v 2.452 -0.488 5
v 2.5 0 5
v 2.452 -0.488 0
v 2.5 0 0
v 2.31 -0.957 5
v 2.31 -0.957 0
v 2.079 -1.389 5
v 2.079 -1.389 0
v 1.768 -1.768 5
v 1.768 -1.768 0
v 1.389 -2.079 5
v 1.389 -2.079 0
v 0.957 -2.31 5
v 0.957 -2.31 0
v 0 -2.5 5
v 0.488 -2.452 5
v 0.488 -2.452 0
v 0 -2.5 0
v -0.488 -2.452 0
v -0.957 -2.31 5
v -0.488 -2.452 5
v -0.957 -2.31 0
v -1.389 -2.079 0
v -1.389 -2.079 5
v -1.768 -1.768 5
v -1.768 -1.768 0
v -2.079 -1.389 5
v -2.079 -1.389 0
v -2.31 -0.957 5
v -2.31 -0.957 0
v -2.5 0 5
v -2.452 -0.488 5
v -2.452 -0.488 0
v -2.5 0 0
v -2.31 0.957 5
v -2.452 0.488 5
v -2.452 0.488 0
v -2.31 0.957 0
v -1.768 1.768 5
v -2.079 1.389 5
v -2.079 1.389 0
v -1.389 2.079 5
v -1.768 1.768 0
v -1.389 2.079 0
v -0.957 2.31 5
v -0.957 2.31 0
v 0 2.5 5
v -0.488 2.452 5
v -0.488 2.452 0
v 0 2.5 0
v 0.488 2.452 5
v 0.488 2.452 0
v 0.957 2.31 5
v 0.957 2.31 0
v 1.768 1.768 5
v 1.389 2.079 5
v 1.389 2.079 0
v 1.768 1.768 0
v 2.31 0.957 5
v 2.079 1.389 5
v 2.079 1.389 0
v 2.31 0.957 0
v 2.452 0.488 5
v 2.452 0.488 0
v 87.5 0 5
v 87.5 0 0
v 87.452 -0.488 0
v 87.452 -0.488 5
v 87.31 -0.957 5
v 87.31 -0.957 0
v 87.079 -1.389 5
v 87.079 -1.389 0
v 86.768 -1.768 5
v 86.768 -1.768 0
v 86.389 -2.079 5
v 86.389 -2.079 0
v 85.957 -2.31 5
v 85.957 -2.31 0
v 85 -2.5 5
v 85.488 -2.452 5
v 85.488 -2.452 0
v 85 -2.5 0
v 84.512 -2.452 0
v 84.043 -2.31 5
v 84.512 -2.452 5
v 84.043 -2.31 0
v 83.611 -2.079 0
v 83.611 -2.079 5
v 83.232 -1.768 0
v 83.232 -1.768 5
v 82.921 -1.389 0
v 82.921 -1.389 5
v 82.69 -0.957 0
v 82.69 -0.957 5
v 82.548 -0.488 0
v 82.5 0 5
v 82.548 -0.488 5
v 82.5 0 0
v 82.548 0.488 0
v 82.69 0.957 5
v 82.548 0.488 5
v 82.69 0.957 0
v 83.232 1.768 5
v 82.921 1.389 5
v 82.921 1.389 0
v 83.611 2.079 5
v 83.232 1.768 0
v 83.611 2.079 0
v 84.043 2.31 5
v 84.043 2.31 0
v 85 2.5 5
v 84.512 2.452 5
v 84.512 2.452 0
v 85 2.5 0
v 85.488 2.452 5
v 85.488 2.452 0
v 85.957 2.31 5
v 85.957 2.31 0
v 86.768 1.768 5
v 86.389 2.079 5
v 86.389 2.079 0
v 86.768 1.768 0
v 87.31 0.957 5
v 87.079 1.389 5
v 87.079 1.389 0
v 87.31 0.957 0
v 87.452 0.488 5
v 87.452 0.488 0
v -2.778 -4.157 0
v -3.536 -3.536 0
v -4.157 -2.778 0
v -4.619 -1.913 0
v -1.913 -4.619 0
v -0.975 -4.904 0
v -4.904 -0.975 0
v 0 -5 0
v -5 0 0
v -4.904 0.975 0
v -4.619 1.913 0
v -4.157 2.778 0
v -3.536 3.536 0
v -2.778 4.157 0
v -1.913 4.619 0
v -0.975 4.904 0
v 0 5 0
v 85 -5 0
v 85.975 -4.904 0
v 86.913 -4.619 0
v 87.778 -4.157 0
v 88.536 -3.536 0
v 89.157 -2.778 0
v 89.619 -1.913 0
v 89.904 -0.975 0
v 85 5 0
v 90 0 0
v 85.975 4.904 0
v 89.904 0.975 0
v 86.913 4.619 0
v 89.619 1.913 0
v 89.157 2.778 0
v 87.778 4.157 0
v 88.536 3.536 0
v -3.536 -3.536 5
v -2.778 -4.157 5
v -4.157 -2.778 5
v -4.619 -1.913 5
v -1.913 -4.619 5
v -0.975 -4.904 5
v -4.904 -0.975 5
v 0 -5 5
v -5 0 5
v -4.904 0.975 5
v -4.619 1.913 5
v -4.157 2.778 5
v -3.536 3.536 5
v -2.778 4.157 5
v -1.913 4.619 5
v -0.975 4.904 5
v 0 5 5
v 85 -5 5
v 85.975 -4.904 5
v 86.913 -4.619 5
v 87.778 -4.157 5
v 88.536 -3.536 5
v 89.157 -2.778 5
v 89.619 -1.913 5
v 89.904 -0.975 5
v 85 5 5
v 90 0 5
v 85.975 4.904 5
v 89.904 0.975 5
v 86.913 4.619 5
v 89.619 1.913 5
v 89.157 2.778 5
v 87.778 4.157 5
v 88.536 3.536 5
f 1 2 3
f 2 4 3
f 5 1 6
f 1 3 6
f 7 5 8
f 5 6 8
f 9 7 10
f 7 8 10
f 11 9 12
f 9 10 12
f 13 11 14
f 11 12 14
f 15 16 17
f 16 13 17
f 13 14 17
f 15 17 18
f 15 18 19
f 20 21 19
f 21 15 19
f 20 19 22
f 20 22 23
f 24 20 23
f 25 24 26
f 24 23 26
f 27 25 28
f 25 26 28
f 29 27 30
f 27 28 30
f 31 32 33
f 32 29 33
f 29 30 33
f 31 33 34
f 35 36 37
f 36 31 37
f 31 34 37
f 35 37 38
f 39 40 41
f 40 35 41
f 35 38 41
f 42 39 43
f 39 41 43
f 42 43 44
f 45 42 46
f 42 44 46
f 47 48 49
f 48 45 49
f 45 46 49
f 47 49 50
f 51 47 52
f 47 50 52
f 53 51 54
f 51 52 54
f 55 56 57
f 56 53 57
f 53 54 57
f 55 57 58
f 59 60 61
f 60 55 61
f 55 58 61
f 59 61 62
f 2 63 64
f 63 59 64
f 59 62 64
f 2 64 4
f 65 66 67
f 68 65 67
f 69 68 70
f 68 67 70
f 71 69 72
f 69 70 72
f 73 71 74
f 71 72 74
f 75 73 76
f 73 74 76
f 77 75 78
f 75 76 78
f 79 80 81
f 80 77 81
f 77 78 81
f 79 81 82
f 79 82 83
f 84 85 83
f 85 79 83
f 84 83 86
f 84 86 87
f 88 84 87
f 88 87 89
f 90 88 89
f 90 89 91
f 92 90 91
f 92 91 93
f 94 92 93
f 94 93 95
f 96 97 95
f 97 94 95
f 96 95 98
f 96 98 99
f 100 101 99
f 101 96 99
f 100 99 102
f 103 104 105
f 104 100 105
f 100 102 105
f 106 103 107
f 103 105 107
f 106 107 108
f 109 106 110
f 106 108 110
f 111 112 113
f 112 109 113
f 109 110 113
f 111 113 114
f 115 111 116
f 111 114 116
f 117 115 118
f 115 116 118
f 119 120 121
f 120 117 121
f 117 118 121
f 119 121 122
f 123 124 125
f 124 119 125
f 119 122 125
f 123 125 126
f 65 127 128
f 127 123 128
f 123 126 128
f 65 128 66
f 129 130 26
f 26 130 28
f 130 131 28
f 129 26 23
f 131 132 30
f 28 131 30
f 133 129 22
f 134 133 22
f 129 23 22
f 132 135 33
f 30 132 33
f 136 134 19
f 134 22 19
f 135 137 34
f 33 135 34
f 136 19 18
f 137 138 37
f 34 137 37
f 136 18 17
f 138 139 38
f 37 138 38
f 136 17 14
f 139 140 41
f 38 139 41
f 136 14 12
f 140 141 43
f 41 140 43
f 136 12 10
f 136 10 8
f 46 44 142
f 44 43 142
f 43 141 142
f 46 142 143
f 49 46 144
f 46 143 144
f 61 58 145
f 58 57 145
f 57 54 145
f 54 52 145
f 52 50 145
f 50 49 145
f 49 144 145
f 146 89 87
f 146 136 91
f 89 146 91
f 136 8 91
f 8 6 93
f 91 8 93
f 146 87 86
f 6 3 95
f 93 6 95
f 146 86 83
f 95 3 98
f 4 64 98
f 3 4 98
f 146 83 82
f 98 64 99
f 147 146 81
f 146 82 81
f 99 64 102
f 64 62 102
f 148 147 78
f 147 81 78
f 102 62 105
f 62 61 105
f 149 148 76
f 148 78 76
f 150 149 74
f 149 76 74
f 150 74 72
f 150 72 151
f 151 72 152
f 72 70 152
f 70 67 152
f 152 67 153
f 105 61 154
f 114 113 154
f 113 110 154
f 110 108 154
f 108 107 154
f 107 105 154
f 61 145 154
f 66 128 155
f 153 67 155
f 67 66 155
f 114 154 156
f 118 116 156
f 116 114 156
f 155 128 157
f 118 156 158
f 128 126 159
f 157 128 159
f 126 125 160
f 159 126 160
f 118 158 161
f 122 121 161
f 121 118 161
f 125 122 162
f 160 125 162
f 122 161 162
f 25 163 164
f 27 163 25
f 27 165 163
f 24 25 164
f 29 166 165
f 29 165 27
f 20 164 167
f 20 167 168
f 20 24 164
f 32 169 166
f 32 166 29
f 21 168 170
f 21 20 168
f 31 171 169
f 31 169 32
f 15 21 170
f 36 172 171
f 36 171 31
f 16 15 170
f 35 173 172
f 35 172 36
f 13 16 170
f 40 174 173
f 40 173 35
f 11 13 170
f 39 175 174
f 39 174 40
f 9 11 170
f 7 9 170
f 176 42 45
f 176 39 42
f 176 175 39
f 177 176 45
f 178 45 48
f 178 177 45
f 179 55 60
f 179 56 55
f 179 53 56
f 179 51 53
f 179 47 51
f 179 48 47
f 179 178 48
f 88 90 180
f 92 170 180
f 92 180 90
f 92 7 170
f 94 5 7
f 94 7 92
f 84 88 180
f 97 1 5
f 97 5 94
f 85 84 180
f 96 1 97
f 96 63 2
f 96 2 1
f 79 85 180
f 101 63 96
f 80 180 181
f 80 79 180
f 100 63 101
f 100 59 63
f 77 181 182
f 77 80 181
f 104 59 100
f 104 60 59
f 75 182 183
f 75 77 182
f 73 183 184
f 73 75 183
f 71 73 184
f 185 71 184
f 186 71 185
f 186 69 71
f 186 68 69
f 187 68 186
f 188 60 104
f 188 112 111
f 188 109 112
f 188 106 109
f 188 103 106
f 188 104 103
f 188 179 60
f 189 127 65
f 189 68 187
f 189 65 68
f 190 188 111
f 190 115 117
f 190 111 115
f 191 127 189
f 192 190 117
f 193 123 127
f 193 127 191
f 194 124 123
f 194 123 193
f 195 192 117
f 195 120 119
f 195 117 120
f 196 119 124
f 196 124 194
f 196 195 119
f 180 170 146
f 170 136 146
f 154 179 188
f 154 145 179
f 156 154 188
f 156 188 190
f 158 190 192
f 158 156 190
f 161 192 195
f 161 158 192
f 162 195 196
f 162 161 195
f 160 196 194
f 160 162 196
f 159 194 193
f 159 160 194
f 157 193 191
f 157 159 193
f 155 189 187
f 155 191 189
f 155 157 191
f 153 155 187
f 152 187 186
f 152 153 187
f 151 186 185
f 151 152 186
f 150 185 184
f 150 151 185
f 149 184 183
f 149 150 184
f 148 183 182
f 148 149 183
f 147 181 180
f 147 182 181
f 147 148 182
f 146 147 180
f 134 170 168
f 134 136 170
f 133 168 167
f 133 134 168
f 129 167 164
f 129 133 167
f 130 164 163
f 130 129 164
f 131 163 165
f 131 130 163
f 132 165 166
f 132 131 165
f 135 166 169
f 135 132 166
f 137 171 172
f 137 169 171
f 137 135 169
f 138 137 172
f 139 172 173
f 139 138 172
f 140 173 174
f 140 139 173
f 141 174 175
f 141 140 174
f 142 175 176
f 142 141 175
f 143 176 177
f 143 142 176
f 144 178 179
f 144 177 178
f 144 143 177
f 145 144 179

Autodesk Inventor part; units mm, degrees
ref_plane "YZ Plane" through (0, 0, 0) normal (1, 0, 0) x (0, 1, 0)
ref_plane "XZ Plane" through (0, 0, 0) normal (0, 1, 0) x (-1, 0, 0)
ref_plane "XY Plane" through (0, 0, 0) normal (0, 0, 1) x (1, 0, 0)
sketch "Boceto1" plane through (0, 0, 0) normal (0, 0, 1) x (1, 0, 0)
  arc A0 (0, 5) -> (0, -5) centre (0, 0) ccw
  arc A1 (85, -5) -> (85, 5) centre (85, 0) ccw
  line L0 (0, 5) -> (85, 5)
  line L1 (0, -5) -> (85, -5)
  circle A2 centre (0, 0) radius 2.5
  circle A3 centre (85, 0) radius 2.5
  dimension "d1" = 10
  dimension "d2" = 10
  dimension "d3" = 5
  dimension "d4" = 5
  dimension "d7" = 85
extrude "Extrusión1" add sketch "Boceto1" along normal blind 5
